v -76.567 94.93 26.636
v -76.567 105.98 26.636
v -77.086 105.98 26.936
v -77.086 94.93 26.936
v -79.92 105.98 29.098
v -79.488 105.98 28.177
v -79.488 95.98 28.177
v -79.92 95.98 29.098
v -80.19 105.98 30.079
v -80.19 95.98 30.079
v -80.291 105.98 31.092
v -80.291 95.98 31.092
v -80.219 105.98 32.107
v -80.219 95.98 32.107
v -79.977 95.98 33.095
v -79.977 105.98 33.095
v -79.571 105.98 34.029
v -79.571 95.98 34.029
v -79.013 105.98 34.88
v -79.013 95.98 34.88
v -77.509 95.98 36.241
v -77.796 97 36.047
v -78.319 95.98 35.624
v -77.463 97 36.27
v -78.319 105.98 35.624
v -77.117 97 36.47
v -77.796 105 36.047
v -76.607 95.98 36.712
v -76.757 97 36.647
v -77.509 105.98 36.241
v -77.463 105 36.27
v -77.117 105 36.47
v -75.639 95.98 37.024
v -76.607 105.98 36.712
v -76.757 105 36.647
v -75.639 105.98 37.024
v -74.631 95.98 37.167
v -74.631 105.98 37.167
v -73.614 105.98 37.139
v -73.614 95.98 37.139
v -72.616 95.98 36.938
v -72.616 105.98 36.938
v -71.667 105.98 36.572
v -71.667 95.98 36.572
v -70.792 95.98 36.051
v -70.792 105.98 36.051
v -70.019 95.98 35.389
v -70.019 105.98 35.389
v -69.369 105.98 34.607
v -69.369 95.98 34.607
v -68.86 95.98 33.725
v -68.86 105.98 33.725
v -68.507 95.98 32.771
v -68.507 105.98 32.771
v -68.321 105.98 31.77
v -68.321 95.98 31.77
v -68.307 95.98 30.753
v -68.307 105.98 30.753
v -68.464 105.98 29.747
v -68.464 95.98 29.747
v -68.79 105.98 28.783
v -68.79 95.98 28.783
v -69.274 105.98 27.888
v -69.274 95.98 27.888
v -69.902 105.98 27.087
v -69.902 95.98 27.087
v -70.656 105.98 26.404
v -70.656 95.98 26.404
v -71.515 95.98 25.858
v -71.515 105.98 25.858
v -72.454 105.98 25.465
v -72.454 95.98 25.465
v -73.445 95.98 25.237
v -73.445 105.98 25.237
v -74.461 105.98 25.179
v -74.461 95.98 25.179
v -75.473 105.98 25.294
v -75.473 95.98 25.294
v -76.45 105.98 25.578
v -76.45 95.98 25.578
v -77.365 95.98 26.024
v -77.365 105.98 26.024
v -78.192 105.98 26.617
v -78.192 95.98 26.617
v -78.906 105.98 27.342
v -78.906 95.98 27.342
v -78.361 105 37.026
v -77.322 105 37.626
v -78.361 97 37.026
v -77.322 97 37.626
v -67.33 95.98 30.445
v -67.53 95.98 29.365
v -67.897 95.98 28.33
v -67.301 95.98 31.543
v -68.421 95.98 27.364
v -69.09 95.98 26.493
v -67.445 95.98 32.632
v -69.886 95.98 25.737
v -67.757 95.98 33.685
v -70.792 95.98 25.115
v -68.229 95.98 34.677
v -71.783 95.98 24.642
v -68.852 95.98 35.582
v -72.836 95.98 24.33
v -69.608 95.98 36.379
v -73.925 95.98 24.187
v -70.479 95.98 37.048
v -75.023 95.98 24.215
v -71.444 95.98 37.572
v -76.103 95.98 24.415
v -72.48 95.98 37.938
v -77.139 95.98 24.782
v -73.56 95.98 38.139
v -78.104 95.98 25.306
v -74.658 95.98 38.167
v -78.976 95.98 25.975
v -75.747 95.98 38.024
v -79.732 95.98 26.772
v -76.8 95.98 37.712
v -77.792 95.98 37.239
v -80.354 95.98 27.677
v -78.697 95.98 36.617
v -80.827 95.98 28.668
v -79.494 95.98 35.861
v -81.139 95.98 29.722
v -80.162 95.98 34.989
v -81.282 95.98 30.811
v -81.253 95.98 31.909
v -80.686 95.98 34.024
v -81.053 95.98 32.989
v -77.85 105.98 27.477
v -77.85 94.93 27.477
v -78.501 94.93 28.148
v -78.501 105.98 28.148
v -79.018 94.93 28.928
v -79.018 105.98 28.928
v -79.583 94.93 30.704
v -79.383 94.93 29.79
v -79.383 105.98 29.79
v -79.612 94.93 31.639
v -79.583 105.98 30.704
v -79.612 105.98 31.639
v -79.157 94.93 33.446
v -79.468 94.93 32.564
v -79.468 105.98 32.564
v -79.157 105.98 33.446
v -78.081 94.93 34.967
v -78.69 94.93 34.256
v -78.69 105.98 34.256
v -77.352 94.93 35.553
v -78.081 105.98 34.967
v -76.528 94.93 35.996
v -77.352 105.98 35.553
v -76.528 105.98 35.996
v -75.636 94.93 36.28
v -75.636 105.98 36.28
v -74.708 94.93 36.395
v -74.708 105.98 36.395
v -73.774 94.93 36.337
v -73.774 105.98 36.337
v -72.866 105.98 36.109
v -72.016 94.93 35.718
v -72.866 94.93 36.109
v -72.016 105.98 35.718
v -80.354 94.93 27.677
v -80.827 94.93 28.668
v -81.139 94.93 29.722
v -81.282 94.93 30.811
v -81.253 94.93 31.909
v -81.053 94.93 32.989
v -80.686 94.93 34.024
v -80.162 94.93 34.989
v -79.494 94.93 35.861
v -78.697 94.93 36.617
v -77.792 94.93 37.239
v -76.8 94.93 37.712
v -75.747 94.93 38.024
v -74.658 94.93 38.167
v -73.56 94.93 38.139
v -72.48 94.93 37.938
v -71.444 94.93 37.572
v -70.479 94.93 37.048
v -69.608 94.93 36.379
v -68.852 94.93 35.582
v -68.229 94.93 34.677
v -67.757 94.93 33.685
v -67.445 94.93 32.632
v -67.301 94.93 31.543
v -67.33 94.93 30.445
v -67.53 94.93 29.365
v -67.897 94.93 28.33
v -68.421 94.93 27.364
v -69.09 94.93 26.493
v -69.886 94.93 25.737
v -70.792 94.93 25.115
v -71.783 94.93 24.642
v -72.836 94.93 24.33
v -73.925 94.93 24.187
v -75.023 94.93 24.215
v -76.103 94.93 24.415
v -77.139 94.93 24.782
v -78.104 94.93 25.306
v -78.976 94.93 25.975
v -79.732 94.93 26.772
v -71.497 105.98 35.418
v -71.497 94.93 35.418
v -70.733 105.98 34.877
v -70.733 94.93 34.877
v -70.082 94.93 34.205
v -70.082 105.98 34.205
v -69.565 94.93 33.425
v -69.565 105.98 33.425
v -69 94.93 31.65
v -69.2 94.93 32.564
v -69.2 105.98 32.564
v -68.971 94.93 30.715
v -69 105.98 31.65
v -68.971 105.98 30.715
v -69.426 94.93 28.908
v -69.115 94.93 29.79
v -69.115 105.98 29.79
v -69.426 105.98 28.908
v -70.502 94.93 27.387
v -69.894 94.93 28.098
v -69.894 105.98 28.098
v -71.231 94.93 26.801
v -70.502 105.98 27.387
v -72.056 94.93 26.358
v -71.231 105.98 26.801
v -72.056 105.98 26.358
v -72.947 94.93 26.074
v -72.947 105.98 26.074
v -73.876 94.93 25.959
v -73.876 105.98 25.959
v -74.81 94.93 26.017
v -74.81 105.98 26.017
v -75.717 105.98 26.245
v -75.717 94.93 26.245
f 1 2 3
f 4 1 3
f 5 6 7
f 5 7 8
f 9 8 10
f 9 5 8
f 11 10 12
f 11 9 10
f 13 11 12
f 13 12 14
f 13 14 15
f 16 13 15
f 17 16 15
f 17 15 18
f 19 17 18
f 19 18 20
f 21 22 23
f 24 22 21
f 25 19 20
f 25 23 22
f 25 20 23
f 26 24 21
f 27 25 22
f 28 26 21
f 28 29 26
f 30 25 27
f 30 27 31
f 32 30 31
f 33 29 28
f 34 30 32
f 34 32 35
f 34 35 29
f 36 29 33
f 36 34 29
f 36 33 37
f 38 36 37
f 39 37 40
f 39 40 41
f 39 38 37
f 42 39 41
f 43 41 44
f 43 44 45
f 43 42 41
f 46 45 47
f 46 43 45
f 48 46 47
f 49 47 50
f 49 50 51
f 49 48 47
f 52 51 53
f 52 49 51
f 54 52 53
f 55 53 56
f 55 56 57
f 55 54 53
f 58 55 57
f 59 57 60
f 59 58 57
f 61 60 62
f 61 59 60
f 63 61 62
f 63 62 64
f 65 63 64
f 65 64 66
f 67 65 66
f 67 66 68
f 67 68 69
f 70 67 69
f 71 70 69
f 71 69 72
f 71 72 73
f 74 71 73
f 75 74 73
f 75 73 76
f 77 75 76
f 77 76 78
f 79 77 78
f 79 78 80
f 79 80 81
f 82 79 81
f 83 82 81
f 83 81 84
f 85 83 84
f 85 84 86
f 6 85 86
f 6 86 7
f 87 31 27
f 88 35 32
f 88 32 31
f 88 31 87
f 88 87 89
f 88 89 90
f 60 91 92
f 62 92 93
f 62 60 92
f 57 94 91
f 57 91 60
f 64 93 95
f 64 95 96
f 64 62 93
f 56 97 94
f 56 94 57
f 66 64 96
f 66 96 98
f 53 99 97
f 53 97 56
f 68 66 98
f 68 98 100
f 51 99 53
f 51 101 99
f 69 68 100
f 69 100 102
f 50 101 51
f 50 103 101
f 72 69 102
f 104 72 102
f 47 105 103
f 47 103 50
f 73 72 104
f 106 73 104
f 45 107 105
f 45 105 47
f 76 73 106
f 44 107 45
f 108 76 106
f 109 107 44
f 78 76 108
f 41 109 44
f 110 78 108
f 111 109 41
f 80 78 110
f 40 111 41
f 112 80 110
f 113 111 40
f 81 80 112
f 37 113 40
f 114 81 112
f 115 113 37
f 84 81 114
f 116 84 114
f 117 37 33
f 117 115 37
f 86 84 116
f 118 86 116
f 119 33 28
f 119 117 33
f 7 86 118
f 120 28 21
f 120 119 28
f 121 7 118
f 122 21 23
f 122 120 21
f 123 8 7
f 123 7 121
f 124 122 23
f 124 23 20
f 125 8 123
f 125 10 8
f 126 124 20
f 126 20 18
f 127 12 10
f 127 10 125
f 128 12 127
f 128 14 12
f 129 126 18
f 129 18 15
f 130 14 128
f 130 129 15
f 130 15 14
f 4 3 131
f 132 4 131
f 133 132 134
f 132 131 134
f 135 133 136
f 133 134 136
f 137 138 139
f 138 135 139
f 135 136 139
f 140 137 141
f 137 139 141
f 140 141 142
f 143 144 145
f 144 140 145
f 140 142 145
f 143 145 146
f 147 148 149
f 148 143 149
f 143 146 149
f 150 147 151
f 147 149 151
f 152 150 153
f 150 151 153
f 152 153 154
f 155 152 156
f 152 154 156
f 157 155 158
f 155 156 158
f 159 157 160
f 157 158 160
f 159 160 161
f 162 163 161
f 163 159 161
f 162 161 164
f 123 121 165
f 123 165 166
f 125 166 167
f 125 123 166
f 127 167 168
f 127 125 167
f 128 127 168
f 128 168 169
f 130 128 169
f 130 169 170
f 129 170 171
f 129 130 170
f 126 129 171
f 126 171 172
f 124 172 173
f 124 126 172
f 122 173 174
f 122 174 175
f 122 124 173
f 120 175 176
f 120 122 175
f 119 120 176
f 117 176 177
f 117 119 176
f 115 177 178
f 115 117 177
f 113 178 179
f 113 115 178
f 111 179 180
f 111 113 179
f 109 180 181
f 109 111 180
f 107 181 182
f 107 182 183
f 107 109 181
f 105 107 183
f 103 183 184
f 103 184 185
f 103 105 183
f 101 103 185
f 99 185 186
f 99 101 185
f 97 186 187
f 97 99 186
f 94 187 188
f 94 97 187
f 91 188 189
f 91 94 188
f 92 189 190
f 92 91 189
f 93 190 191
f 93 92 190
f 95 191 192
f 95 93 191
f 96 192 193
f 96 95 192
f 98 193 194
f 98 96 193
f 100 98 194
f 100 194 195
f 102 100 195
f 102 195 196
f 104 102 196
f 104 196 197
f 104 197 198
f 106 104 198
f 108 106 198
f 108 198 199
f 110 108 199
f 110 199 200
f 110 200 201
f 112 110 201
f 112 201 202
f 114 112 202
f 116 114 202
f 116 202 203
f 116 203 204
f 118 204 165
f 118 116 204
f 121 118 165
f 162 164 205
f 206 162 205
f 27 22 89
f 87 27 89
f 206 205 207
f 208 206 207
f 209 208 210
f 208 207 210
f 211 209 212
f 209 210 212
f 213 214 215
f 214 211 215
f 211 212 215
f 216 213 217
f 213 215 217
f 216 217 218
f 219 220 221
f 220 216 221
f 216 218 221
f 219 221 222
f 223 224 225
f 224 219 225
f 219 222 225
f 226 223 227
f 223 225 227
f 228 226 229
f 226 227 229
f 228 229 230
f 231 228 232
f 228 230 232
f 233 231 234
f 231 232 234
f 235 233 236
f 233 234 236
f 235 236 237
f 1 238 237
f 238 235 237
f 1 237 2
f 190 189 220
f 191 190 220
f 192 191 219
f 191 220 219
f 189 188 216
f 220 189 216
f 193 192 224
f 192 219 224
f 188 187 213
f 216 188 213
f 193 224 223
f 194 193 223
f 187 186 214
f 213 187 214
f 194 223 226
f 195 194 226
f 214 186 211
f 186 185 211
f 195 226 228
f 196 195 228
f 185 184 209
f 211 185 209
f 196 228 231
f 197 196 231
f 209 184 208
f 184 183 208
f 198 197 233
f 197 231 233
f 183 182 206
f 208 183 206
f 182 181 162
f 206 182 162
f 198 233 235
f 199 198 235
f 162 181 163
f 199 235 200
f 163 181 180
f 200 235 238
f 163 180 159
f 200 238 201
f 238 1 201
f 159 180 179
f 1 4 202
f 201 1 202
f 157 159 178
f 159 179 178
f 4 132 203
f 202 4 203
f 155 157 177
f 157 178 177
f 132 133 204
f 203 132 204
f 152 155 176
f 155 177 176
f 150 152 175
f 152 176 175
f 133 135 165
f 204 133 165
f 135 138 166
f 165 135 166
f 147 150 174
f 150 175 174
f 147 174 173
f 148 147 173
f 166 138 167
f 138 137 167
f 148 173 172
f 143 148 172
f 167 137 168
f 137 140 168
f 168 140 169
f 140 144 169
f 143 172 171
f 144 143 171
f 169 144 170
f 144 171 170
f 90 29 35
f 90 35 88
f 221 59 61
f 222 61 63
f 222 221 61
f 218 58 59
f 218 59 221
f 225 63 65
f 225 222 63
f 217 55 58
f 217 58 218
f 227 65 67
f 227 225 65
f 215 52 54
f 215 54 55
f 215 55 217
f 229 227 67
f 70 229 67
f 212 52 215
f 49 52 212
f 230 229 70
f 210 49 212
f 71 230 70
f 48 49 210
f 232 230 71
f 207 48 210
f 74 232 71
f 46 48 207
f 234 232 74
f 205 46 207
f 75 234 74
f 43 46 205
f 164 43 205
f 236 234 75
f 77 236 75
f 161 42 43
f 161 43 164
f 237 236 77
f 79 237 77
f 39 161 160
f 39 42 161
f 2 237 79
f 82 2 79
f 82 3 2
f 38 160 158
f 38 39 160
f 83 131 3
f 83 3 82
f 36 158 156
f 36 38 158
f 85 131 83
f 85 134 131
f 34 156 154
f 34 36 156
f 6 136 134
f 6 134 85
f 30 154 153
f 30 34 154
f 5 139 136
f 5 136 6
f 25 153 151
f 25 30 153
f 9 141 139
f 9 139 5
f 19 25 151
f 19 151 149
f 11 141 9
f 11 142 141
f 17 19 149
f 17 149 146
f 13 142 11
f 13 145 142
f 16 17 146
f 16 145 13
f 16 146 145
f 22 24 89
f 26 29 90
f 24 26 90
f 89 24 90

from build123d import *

# Parameters (mm, degrees)
GUIDE_BUSH_BARREL_SKETCH_R      = 6
GUIDE_BUSH_BARREL_DEPTH         = 10
GUIDE_BUSH_FLANGE_SKETCH_R      = 7
GUIDE_BUSH_FLANGE_DEPTH         = 1.05
DIRECTIONAL_RUNNING_SLOT_DEPTH  = 11.25
ANTIROTATION_GUIDE_KEY_SKETCH_W = 1.3
ANTIROTATION_GUIDE_KEY_SKETCH_H = 1.2
ANTIROTATION_GUIDE_KEY_DEPTH    = 8
MOVE2_ANGLE                     = 120


with BuildPart() as part:
    # Guide bush barrel sketch → Guide bush barrel (new body)
    with BuildSketch(Plane(origin=(0, -105.98, 0), x_dir=(1, 0, 0), z_dir=(0, 1, 0))):
        with Locations(Location((-20.291651246, 0, 0), (0, 0, 270))):
            Circle(GUIDE_BUSH_BARREL_SKETCH_R)
    extrude(amount=GUIDE_BUSH_BARREL_DEPTH)

    # Guide bush flange sketch → Guide bush flange (add)
    with BuildSketch(Plane(origin=(0, -95.98, 0), x_dir=(1, 0, 0), z_dir=(0, 1, 0))):
        with Locations(Location((-20.291651246, 0, 0), (0, 0, 270))):
            Circle(GUIDE_BUSH_FLANGE_SKETCH_R)
    extrude(amount=GUIDE_BUSH_FLANGE_DEPTH)

    # Directional running slot sketch → Directional running slot (cut)
    with BuildSketch(Plane(origin=(0, -106.08, 0), x_dir=(1, 0, 0), z_dir=(0, 1, 0))):
        with BuildLine():
            Line((-23.086458867, -4.240748797), (-22.566843625, -4.540748797))
            ThreePointArc((-22.566843625, -4.540748797), (-15.641094828, -2.685), (-17.496843625, 4.240748797))
            Line((-17.496843625, 4.240748797), (-18.016458867, 4.540748797))
            ThreePointArc((-18.016458867, 4.540748797), (-24.942207664, 2.685), (-23.086458867, -4.240748797))
        make_face()
    extrude(amount=DIRECTIONAL_RUNNING_SLOT_DEPTH, mode=Mode.SUBTRACT)

    # Antirotation guide key sketch → Antirotation guide key (add)
    with BuildSketch(Plane(origin=(0, -105, 0), x_dir=(1, 0, 0), z_dir=(0, 1, 0))):
        with Locations((-13.841651246, 0)):
            Rectangle(ANTIROTATION_GUIDE_KEY_SKETCH_W, ANTIROTATION_GUIDE_KEY_SKETCH_H)
    extrude(amount=ANTIROTATION_GUIDE_KEY_DEPTH)


with BuildPart() as part_1:
    # Move1: moved
    add(part.part.moved(Location((56.291651246, 0, 0))))


with BuildPart() as part_2:
    # Move2: moved
    add(part_1.part.rotate(Axis((0, 0, 0), (0, -1, 0)), MOVE2_ANGLE))


with BuildPart() as part_3:
    # Move3: moved
    add(part_2.part.moved(Location((-56.291651246, 0, 0))))


with BuildPart() as body_2:
    # Mirror1: mirrored copy
    add(part_3.part.mirror(Plane(origin=(0, 0, 0), x_dir=(0, 0, 1), z_dir=(0, -1, 0))))


solid = body_2.part
